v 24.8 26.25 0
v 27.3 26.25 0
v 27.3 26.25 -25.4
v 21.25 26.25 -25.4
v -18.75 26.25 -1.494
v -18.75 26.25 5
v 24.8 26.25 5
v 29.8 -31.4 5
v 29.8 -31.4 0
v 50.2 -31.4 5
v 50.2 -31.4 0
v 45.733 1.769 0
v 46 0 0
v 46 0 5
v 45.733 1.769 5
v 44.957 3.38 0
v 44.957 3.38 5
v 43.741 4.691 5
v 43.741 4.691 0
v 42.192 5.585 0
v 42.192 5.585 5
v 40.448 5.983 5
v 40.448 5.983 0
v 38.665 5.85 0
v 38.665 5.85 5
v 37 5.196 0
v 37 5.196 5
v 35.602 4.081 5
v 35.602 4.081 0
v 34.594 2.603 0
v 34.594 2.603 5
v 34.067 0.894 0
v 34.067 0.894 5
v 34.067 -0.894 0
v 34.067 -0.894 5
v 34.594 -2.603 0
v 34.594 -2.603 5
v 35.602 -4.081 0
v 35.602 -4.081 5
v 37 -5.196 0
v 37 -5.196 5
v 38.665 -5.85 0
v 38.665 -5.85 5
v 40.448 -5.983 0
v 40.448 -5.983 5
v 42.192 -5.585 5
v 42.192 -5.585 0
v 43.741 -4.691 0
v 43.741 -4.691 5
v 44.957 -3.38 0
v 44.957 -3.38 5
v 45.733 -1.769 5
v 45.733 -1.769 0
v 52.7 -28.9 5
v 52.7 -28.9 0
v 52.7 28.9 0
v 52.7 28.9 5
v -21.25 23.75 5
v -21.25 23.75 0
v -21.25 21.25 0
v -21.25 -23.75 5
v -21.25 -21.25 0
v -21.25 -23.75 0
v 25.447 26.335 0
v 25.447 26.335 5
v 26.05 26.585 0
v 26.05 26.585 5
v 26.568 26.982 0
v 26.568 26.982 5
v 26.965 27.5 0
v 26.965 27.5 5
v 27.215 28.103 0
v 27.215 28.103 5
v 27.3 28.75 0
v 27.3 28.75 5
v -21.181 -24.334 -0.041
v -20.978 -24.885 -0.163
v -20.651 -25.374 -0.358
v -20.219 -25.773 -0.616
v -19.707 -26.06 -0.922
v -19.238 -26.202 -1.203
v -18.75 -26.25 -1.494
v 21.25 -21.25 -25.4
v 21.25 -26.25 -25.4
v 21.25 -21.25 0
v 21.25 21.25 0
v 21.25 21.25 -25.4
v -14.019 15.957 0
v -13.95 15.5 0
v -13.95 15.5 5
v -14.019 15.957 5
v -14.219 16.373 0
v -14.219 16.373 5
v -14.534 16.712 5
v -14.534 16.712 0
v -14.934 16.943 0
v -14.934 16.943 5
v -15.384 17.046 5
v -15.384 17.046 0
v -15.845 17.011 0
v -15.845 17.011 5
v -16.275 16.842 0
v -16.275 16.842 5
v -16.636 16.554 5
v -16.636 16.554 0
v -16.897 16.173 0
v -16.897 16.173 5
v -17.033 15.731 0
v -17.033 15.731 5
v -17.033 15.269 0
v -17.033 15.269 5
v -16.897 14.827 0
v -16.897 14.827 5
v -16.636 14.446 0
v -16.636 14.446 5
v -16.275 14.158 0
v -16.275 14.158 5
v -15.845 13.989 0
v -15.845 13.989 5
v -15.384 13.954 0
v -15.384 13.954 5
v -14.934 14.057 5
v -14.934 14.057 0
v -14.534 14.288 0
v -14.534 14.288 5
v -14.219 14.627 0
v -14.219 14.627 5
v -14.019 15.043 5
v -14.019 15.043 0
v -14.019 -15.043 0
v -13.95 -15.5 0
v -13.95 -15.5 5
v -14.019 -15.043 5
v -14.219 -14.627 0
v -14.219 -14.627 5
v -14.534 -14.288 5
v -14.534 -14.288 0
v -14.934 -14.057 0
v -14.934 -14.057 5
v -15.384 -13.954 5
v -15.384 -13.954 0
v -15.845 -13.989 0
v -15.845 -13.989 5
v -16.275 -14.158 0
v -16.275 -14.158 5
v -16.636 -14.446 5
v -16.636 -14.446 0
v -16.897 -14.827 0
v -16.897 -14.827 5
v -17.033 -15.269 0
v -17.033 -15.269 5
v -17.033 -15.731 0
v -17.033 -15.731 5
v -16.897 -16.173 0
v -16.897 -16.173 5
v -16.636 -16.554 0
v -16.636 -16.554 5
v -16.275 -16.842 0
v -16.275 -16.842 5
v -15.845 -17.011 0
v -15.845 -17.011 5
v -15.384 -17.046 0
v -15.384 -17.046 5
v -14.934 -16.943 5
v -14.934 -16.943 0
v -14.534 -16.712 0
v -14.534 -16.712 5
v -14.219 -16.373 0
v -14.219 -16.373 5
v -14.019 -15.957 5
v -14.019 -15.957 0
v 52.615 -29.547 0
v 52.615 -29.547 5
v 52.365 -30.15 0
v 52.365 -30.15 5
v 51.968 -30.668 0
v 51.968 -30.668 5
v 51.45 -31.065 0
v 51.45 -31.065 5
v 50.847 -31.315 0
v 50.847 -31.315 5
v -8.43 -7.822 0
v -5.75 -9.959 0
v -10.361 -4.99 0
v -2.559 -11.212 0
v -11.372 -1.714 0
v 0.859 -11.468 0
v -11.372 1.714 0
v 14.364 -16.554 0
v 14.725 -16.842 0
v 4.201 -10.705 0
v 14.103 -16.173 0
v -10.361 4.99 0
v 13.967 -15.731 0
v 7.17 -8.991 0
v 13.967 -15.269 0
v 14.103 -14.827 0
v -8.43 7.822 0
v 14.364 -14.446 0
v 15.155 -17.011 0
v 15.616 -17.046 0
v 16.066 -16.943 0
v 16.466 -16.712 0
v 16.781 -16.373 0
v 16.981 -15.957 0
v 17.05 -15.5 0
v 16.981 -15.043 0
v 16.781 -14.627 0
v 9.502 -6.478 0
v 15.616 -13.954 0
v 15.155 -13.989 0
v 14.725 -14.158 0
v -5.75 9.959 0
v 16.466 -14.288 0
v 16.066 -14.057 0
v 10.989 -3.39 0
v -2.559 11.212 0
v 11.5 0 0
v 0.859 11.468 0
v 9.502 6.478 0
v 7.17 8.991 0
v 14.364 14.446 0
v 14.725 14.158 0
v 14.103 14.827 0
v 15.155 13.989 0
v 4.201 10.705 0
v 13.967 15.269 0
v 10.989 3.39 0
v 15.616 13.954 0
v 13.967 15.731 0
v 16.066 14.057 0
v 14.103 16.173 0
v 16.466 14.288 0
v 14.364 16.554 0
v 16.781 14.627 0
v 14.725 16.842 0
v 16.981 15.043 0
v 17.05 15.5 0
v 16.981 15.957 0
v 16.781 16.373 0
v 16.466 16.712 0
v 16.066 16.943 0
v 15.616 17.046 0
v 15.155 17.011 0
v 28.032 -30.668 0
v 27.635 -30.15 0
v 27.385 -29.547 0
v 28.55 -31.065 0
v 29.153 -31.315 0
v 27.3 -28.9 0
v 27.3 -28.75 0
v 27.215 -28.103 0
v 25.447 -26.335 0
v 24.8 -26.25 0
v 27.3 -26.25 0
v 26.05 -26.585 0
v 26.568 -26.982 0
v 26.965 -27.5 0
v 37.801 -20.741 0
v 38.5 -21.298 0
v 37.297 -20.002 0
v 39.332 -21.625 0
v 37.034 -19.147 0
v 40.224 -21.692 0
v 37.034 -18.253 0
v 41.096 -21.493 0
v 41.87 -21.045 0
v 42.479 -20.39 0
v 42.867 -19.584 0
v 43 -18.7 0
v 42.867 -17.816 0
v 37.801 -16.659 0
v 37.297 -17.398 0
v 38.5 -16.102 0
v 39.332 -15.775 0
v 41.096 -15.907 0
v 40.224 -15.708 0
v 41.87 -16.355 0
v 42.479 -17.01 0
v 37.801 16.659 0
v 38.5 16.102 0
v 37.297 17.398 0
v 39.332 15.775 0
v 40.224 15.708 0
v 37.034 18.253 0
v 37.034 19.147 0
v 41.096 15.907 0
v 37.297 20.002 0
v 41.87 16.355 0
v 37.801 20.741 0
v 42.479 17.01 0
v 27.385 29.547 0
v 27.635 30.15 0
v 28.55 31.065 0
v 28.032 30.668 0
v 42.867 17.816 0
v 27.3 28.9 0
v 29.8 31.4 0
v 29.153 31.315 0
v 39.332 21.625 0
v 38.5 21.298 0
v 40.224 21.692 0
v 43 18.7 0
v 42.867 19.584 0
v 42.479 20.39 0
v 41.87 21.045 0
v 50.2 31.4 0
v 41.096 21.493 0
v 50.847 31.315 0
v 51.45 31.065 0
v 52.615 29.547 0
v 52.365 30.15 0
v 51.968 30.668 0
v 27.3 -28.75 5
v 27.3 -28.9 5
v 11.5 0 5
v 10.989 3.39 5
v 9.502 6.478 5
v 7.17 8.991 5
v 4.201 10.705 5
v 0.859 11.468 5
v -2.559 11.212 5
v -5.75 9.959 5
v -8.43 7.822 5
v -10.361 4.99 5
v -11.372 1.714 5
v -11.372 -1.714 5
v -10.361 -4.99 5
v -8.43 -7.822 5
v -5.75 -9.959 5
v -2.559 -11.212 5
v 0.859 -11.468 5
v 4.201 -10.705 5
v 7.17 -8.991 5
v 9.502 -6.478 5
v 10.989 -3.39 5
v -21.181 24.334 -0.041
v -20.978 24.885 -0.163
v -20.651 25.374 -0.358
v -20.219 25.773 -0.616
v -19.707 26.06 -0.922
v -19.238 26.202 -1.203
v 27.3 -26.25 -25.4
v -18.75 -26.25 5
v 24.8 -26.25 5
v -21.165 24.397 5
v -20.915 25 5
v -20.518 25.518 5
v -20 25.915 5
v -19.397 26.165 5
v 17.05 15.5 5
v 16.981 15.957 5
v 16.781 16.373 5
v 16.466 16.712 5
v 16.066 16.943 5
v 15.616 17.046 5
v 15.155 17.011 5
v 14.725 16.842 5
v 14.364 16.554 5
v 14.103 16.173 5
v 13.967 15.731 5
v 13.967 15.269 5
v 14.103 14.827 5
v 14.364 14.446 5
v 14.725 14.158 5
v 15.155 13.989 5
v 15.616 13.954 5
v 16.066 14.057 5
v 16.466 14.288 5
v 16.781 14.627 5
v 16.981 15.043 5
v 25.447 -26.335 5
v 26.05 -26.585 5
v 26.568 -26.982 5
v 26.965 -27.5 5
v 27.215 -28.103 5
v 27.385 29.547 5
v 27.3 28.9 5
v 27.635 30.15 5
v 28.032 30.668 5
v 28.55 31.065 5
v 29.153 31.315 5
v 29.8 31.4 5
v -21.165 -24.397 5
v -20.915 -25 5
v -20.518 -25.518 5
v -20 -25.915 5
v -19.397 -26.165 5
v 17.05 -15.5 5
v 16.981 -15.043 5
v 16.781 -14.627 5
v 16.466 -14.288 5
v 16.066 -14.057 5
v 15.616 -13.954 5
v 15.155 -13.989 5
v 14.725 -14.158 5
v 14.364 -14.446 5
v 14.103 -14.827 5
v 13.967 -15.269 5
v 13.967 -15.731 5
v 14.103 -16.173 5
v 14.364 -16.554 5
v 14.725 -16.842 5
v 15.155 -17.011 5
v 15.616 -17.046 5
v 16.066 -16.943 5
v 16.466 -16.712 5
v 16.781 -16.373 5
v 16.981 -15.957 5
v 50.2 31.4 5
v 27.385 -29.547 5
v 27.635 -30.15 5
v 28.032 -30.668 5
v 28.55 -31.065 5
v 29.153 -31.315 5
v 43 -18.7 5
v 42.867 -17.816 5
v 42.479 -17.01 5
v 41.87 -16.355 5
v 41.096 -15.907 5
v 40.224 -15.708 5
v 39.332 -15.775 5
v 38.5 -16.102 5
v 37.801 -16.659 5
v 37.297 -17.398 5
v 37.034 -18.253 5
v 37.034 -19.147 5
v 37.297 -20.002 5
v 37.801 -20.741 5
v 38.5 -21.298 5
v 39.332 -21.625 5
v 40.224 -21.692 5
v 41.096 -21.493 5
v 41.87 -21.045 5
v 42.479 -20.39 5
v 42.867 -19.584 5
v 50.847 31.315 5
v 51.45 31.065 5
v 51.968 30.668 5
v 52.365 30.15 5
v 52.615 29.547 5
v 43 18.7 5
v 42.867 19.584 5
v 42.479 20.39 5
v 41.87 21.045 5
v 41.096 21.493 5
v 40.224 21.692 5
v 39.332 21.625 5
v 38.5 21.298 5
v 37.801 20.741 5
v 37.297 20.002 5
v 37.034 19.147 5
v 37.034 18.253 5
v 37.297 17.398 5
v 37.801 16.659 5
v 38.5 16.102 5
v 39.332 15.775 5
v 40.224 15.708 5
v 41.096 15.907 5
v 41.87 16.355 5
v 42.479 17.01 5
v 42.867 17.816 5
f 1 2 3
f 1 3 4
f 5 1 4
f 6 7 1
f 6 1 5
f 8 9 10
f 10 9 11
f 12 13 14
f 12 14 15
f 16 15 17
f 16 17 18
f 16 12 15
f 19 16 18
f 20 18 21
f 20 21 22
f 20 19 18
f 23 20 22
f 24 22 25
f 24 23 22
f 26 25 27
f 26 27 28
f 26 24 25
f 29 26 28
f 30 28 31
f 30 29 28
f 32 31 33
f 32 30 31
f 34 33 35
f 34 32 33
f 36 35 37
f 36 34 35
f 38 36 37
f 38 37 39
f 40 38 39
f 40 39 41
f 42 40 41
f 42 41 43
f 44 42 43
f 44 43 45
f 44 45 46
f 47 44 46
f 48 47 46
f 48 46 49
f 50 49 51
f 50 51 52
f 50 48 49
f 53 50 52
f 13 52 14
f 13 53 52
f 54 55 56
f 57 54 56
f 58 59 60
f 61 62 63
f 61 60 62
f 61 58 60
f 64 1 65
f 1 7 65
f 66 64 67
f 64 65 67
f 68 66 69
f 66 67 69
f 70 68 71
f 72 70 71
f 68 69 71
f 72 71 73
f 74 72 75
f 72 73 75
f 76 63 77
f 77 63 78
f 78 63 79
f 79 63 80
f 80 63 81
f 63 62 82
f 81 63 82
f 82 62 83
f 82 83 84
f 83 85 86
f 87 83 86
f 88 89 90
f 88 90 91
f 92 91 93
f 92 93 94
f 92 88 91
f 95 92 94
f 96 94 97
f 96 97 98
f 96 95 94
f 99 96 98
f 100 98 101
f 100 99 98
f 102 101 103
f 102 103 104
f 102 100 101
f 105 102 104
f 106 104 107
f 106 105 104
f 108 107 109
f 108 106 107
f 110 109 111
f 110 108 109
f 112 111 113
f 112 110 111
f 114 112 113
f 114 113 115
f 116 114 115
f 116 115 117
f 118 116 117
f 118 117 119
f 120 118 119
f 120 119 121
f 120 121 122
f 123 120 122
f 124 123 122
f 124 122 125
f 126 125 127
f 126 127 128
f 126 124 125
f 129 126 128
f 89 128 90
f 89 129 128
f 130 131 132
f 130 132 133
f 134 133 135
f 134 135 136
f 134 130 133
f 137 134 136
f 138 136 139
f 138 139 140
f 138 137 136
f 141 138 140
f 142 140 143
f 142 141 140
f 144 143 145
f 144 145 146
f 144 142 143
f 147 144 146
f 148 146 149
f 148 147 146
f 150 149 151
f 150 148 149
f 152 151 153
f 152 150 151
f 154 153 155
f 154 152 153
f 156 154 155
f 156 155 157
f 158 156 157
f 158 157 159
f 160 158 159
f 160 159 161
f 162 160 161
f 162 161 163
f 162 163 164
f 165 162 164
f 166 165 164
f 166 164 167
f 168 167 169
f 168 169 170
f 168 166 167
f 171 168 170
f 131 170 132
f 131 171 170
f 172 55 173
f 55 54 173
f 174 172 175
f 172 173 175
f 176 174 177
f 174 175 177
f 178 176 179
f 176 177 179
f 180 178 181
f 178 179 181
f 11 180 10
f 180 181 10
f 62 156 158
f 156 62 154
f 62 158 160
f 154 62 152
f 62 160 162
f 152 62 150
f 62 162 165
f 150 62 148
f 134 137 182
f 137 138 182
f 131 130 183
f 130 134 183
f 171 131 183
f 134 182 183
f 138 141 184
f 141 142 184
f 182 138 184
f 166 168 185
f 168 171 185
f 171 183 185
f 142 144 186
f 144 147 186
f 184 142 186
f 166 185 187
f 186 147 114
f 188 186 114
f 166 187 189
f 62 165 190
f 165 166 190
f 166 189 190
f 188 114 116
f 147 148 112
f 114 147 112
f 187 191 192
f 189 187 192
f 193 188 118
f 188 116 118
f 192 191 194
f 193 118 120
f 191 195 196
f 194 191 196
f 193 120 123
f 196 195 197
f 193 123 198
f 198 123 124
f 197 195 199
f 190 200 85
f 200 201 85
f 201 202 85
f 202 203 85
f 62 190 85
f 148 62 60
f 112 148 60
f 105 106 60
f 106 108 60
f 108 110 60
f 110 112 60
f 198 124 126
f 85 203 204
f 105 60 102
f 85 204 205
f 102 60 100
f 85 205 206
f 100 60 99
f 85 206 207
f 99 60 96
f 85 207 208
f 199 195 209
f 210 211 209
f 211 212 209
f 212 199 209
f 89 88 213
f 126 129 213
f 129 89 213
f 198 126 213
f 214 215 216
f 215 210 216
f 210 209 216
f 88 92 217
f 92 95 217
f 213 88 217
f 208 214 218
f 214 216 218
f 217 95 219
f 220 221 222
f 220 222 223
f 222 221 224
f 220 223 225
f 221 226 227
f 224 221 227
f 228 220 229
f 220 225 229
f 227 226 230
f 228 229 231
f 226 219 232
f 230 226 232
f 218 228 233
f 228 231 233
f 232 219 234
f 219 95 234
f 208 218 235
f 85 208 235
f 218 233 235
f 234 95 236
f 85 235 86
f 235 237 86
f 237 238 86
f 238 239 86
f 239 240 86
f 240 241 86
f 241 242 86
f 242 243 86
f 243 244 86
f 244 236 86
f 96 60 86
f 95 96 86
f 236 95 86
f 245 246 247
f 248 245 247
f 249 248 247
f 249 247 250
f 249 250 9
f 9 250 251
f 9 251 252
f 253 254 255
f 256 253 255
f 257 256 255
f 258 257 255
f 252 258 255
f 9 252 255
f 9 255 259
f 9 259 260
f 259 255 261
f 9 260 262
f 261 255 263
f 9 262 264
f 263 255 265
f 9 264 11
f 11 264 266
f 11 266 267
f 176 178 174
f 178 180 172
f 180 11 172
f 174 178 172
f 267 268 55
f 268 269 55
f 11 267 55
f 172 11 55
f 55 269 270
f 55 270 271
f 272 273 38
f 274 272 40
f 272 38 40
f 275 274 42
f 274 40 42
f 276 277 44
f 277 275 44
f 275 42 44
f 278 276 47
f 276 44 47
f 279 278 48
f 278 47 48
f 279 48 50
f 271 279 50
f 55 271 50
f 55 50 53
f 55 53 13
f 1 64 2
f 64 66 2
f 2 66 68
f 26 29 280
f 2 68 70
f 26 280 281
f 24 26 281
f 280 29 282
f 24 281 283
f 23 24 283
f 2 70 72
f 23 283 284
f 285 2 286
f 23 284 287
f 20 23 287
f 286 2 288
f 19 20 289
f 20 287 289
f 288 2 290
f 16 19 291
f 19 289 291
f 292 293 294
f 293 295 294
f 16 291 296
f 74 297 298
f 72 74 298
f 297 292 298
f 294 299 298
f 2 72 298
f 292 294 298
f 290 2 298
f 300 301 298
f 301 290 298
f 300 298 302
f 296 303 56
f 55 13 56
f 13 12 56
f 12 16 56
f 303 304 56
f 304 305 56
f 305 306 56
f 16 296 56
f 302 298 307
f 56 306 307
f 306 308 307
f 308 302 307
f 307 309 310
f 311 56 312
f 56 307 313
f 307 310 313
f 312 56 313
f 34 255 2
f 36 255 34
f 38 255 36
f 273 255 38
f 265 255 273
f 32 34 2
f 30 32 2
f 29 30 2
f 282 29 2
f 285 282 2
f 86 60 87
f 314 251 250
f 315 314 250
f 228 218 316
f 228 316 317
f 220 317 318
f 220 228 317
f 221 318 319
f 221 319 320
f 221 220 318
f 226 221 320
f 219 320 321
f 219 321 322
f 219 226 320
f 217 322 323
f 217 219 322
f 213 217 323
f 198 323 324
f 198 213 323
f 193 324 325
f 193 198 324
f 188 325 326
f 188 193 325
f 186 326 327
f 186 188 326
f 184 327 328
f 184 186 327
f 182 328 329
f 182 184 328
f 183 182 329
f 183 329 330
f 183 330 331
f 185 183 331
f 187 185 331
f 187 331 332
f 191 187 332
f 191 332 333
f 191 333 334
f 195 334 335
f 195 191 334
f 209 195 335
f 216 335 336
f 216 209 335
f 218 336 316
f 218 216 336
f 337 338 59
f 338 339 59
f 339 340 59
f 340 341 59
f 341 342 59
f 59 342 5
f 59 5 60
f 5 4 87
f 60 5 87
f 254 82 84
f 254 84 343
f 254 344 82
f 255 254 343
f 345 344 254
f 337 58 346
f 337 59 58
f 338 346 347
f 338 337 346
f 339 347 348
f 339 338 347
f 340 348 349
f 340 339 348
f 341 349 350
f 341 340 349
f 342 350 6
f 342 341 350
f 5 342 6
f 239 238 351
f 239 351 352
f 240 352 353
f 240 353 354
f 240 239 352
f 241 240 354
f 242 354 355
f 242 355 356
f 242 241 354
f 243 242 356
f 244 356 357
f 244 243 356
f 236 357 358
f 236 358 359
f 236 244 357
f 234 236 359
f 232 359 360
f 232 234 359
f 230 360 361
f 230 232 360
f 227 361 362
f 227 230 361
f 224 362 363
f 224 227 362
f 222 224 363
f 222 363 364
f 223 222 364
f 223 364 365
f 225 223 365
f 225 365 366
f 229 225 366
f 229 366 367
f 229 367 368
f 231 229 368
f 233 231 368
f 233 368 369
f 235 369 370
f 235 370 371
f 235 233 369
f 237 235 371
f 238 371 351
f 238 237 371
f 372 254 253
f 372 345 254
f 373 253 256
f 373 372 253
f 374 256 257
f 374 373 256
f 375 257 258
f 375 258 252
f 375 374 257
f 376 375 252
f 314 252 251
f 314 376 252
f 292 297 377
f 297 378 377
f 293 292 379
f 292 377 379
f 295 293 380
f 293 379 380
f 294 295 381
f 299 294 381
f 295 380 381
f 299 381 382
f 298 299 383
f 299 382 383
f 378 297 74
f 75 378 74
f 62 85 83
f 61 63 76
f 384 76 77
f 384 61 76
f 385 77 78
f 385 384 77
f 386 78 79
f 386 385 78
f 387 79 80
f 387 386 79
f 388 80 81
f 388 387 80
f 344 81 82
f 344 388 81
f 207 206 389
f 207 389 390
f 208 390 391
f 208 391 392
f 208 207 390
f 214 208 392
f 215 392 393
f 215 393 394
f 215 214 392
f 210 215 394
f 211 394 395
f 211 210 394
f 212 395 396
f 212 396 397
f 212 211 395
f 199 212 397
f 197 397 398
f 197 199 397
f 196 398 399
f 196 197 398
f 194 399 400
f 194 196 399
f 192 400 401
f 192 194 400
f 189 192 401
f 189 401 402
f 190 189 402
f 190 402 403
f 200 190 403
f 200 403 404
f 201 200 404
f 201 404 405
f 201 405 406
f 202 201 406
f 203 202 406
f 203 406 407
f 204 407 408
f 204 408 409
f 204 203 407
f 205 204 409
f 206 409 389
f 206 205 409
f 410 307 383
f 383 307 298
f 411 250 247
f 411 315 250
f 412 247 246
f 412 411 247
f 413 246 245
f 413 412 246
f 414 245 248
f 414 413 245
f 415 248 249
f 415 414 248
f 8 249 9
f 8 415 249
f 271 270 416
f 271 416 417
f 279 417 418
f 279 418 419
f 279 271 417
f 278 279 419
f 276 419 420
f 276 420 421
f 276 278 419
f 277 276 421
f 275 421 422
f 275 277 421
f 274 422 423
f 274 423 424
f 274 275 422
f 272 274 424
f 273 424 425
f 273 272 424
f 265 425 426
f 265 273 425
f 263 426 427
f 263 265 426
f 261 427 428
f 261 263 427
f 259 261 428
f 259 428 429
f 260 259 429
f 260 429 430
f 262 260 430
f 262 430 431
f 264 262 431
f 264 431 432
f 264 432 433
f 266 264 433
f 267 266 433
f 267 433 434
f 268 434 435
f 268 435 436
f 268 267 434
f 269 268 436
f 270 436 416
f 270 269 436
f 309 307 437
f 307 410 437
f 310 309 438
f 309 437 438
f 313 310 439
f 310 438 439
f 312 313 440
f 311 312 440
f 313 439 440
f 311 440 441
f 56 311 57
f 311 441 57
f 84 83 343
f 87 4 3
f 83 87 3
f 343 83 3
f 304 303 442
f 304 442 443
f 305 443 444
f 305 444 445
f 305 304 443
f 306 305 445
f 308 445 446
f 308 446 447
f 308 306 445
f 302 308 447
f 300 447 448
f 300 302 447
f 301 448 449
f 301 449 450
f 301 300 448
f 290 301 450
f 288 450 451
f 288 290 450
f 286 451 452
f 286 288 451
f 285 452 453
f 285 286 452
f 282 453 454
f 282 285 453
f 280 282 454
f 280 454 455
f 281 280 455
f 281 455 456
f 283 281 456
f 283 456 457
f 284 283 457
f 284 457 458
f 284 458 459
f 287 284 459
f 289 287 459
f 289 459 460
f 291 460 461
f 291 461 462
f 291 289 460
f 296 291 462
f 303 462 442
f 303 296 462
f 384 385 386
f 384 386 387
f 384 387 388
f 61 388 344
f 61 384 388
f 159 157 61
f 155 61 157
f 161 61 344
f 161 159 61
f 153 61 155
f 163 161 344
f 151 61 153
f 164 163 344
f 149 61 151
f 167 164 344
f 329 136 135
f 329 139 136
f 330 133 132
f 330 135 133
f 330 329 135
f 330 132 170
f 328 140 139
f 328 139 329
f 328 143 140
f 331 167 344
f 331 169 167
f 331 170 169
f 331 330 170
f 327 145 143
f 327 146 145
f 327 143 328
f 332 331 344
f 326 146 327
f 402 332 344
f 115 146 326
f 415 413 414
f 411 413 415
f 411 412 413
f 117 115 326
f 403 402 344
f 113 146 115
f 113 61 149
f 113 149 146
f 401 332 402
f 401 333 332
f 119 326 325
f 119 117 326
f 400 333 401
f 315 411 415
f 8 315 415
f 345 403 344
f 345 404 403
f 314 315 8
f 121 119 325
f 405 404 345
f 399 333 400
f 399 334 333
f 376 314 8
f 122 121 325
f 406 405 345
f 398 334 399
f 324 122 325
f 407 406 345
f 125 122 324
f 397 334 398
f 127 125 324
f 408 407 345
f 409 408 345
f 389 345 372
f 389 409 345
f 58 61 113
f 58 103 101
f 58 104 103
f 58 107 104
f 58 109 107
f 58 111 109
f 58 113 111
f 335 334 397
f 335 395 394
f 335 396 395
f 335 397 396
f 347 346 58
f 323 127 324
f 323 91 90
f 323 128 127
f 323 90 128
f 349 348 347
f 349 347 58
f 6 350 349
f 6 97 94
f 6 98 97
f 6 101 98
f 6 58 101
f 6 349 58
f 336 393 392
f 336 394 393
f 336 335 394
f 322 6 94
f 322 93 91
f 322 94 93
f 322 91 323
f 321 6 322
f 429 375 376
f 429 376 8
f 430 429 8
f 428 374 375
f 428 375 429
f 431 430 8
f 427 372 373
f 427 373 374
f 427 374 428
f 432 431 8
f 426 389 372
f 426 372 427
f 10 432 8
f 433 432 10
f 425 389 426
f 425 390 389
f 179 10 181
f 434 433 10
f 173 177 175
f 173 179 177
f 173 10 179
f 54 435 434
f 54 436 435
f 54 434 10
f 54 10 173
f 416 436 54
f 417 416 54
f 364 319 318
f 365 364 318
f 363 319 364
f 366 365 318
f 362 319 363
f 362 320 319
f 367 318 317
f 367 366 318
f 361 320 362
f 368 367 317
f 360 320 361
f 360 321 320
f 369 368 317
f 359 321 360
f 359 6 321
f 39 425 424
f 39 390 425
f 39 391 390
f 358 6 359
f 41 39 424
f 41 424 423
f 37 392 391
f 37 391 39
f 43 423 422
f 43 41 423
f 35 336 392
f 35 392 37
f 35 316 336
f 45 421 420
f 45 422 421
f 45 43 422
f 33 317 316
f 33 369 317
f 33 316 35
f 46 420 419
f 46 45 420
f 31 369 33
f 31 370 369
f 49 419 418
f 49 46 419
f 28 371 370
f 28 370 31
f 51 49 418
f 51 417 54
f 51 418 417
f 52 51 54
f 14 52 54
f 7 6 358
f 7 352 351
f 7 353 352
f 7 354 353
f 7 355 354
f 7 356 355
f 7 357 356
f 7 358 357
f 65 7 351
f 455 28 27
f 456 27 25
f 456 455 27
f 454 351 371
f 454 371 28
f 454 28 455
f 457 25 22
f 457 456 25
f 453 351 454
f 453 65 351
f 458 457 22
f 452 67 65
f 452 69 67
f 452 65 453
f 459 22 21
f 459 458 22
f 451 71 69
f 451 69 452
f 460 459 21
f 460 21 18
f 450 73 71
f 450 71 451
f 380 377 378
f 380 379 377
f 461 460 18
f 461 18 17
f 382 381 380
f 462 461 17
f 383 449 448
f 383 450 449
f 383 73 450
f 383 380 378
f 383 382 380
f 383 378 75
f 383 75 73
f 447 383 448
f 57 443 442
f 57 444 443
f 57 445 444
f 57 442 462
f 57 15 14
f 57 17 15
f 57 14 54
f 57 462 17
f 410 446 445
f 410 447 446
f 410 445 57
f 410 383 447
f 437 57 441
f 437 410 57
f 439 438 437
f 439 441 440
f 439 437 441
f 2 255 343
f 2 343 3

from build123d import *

# Parameters (mm, degrees)
F0_W     = 42.5
F0_H     = 42.5
F0_R     = 1.55
F0_R_2   = 11.5
F0_W_2   = 6.05
F0_R_3   = 3
F0_R_4   = 6
F1_DEPTH = 5
F2_DEPTH = 25.4
F3_SIZE2 = 42.5
F3_SIZE  = 25.4
F4_R     = 2.5


with BuildPart() as f1:
    # F0 (on Top) → F1 (new body)
    with BuildSketch(Plane.XY):
        Rectangle(F0_W, F0_H)
        with Locations((-15.5, -15.5)):
            Circle(F0_R, mode=Mode.SUBTRACT)
        with Locations((15.5, -15.5)):
            Circle(F0_R, mode=Mode.SUBTRACT)
        with Locations((-15.5, 15.5)):
            Circle(F0_R, mode=Mode.SUBTRACT)
        Circle(F0_R_2, mode=Mode.SUBTRACT)
        with Locations((15.5, 15.5)):
            Circle(F0_R, mode=Mode.SUBTRACT)
        Polygon((-21.25, 21.25), (21.25, 21.25), (27.3, 21.25), (27.3, 26.25), (-21.25, 26.25), align=None)
        with Locations((24.275, 0)):
            Rectangle(F0_W_2, F0_H)
        Polygon((27.3, -21.25), (21.25, -21.25), (-21.25, -21.25), (-21.25, -26.25), (27.3, -26.25), align=None)
        Polygon((27.3, 26.25), (27.3, 21.25), (27.3, -21.25), (27.3, -26.25), (27.3, -31.4), (52.7, -31.4), (52.7, 31.4), (27.3, 31.4), align=None)
        with Locations((40, -18.7)):
            Circle(F0_R_3, mode=Mode.SUBTRACT)
        with Locations((40, 0)):
            Circle(F0_R_4, mode=Mode.SUBTRACT)
        with Locations((40, 18.7)):
            Circle(F0_R_3, mode=Mode.SUBTRACT)
    extrude(amount=F1_DEPTH)

    # F0 (on Top) → F2 (join)
    with BuildSketch(Plane.XY):
        Polygon((27.3, -21.25), (21.25, -21.25), (-21.25, -21.25), (-21.25, -26.25), (27.3, -26.25), align=None)
        with Locations((24.275, 0)):
            Rectangle(F0_W_2, F0_H)
        Polygon((-21.25, 21.25), (21.25, 21.25), (27.3, 21.25), (27.3, 26.25), (-21.25, 26.25), align=None)
    extrude(amount=-F2_DEPTH)

    # F3
    f3_edges = [f1.edges().sort_by_distance(p)[0] for p in [
        (-21.25, -23.75, -25.4),
        (-21.25, 23.75, -25.4),
    ]]
    f3_side = f1.faces().sort_by_distance((-21.25, 0, 4.393336))[0]
    chamfer(f3_edges, length=F3_SIZE, length2=F3_SIZE2, reference=f3_side)

    # F4
    f4_edges = [f1.edges().sort_by_distance(p)[0] for p in [
        (27.3, 31.4, 2.5),
        (52.7, 31.4, 2.5),
        (27.3, 26.25, 2.5),
        (-21.25, 26.25, 2.5),
        (52.7, -31.4, 2.5),
        (27.3, -31.4, 2.5),
        (27.3, -26.25, 2.5),
        (-21.25, -26.25, 2.5),
    ]]
    fillet(f4_edges, radius=F4_R)


solid = f1.part
